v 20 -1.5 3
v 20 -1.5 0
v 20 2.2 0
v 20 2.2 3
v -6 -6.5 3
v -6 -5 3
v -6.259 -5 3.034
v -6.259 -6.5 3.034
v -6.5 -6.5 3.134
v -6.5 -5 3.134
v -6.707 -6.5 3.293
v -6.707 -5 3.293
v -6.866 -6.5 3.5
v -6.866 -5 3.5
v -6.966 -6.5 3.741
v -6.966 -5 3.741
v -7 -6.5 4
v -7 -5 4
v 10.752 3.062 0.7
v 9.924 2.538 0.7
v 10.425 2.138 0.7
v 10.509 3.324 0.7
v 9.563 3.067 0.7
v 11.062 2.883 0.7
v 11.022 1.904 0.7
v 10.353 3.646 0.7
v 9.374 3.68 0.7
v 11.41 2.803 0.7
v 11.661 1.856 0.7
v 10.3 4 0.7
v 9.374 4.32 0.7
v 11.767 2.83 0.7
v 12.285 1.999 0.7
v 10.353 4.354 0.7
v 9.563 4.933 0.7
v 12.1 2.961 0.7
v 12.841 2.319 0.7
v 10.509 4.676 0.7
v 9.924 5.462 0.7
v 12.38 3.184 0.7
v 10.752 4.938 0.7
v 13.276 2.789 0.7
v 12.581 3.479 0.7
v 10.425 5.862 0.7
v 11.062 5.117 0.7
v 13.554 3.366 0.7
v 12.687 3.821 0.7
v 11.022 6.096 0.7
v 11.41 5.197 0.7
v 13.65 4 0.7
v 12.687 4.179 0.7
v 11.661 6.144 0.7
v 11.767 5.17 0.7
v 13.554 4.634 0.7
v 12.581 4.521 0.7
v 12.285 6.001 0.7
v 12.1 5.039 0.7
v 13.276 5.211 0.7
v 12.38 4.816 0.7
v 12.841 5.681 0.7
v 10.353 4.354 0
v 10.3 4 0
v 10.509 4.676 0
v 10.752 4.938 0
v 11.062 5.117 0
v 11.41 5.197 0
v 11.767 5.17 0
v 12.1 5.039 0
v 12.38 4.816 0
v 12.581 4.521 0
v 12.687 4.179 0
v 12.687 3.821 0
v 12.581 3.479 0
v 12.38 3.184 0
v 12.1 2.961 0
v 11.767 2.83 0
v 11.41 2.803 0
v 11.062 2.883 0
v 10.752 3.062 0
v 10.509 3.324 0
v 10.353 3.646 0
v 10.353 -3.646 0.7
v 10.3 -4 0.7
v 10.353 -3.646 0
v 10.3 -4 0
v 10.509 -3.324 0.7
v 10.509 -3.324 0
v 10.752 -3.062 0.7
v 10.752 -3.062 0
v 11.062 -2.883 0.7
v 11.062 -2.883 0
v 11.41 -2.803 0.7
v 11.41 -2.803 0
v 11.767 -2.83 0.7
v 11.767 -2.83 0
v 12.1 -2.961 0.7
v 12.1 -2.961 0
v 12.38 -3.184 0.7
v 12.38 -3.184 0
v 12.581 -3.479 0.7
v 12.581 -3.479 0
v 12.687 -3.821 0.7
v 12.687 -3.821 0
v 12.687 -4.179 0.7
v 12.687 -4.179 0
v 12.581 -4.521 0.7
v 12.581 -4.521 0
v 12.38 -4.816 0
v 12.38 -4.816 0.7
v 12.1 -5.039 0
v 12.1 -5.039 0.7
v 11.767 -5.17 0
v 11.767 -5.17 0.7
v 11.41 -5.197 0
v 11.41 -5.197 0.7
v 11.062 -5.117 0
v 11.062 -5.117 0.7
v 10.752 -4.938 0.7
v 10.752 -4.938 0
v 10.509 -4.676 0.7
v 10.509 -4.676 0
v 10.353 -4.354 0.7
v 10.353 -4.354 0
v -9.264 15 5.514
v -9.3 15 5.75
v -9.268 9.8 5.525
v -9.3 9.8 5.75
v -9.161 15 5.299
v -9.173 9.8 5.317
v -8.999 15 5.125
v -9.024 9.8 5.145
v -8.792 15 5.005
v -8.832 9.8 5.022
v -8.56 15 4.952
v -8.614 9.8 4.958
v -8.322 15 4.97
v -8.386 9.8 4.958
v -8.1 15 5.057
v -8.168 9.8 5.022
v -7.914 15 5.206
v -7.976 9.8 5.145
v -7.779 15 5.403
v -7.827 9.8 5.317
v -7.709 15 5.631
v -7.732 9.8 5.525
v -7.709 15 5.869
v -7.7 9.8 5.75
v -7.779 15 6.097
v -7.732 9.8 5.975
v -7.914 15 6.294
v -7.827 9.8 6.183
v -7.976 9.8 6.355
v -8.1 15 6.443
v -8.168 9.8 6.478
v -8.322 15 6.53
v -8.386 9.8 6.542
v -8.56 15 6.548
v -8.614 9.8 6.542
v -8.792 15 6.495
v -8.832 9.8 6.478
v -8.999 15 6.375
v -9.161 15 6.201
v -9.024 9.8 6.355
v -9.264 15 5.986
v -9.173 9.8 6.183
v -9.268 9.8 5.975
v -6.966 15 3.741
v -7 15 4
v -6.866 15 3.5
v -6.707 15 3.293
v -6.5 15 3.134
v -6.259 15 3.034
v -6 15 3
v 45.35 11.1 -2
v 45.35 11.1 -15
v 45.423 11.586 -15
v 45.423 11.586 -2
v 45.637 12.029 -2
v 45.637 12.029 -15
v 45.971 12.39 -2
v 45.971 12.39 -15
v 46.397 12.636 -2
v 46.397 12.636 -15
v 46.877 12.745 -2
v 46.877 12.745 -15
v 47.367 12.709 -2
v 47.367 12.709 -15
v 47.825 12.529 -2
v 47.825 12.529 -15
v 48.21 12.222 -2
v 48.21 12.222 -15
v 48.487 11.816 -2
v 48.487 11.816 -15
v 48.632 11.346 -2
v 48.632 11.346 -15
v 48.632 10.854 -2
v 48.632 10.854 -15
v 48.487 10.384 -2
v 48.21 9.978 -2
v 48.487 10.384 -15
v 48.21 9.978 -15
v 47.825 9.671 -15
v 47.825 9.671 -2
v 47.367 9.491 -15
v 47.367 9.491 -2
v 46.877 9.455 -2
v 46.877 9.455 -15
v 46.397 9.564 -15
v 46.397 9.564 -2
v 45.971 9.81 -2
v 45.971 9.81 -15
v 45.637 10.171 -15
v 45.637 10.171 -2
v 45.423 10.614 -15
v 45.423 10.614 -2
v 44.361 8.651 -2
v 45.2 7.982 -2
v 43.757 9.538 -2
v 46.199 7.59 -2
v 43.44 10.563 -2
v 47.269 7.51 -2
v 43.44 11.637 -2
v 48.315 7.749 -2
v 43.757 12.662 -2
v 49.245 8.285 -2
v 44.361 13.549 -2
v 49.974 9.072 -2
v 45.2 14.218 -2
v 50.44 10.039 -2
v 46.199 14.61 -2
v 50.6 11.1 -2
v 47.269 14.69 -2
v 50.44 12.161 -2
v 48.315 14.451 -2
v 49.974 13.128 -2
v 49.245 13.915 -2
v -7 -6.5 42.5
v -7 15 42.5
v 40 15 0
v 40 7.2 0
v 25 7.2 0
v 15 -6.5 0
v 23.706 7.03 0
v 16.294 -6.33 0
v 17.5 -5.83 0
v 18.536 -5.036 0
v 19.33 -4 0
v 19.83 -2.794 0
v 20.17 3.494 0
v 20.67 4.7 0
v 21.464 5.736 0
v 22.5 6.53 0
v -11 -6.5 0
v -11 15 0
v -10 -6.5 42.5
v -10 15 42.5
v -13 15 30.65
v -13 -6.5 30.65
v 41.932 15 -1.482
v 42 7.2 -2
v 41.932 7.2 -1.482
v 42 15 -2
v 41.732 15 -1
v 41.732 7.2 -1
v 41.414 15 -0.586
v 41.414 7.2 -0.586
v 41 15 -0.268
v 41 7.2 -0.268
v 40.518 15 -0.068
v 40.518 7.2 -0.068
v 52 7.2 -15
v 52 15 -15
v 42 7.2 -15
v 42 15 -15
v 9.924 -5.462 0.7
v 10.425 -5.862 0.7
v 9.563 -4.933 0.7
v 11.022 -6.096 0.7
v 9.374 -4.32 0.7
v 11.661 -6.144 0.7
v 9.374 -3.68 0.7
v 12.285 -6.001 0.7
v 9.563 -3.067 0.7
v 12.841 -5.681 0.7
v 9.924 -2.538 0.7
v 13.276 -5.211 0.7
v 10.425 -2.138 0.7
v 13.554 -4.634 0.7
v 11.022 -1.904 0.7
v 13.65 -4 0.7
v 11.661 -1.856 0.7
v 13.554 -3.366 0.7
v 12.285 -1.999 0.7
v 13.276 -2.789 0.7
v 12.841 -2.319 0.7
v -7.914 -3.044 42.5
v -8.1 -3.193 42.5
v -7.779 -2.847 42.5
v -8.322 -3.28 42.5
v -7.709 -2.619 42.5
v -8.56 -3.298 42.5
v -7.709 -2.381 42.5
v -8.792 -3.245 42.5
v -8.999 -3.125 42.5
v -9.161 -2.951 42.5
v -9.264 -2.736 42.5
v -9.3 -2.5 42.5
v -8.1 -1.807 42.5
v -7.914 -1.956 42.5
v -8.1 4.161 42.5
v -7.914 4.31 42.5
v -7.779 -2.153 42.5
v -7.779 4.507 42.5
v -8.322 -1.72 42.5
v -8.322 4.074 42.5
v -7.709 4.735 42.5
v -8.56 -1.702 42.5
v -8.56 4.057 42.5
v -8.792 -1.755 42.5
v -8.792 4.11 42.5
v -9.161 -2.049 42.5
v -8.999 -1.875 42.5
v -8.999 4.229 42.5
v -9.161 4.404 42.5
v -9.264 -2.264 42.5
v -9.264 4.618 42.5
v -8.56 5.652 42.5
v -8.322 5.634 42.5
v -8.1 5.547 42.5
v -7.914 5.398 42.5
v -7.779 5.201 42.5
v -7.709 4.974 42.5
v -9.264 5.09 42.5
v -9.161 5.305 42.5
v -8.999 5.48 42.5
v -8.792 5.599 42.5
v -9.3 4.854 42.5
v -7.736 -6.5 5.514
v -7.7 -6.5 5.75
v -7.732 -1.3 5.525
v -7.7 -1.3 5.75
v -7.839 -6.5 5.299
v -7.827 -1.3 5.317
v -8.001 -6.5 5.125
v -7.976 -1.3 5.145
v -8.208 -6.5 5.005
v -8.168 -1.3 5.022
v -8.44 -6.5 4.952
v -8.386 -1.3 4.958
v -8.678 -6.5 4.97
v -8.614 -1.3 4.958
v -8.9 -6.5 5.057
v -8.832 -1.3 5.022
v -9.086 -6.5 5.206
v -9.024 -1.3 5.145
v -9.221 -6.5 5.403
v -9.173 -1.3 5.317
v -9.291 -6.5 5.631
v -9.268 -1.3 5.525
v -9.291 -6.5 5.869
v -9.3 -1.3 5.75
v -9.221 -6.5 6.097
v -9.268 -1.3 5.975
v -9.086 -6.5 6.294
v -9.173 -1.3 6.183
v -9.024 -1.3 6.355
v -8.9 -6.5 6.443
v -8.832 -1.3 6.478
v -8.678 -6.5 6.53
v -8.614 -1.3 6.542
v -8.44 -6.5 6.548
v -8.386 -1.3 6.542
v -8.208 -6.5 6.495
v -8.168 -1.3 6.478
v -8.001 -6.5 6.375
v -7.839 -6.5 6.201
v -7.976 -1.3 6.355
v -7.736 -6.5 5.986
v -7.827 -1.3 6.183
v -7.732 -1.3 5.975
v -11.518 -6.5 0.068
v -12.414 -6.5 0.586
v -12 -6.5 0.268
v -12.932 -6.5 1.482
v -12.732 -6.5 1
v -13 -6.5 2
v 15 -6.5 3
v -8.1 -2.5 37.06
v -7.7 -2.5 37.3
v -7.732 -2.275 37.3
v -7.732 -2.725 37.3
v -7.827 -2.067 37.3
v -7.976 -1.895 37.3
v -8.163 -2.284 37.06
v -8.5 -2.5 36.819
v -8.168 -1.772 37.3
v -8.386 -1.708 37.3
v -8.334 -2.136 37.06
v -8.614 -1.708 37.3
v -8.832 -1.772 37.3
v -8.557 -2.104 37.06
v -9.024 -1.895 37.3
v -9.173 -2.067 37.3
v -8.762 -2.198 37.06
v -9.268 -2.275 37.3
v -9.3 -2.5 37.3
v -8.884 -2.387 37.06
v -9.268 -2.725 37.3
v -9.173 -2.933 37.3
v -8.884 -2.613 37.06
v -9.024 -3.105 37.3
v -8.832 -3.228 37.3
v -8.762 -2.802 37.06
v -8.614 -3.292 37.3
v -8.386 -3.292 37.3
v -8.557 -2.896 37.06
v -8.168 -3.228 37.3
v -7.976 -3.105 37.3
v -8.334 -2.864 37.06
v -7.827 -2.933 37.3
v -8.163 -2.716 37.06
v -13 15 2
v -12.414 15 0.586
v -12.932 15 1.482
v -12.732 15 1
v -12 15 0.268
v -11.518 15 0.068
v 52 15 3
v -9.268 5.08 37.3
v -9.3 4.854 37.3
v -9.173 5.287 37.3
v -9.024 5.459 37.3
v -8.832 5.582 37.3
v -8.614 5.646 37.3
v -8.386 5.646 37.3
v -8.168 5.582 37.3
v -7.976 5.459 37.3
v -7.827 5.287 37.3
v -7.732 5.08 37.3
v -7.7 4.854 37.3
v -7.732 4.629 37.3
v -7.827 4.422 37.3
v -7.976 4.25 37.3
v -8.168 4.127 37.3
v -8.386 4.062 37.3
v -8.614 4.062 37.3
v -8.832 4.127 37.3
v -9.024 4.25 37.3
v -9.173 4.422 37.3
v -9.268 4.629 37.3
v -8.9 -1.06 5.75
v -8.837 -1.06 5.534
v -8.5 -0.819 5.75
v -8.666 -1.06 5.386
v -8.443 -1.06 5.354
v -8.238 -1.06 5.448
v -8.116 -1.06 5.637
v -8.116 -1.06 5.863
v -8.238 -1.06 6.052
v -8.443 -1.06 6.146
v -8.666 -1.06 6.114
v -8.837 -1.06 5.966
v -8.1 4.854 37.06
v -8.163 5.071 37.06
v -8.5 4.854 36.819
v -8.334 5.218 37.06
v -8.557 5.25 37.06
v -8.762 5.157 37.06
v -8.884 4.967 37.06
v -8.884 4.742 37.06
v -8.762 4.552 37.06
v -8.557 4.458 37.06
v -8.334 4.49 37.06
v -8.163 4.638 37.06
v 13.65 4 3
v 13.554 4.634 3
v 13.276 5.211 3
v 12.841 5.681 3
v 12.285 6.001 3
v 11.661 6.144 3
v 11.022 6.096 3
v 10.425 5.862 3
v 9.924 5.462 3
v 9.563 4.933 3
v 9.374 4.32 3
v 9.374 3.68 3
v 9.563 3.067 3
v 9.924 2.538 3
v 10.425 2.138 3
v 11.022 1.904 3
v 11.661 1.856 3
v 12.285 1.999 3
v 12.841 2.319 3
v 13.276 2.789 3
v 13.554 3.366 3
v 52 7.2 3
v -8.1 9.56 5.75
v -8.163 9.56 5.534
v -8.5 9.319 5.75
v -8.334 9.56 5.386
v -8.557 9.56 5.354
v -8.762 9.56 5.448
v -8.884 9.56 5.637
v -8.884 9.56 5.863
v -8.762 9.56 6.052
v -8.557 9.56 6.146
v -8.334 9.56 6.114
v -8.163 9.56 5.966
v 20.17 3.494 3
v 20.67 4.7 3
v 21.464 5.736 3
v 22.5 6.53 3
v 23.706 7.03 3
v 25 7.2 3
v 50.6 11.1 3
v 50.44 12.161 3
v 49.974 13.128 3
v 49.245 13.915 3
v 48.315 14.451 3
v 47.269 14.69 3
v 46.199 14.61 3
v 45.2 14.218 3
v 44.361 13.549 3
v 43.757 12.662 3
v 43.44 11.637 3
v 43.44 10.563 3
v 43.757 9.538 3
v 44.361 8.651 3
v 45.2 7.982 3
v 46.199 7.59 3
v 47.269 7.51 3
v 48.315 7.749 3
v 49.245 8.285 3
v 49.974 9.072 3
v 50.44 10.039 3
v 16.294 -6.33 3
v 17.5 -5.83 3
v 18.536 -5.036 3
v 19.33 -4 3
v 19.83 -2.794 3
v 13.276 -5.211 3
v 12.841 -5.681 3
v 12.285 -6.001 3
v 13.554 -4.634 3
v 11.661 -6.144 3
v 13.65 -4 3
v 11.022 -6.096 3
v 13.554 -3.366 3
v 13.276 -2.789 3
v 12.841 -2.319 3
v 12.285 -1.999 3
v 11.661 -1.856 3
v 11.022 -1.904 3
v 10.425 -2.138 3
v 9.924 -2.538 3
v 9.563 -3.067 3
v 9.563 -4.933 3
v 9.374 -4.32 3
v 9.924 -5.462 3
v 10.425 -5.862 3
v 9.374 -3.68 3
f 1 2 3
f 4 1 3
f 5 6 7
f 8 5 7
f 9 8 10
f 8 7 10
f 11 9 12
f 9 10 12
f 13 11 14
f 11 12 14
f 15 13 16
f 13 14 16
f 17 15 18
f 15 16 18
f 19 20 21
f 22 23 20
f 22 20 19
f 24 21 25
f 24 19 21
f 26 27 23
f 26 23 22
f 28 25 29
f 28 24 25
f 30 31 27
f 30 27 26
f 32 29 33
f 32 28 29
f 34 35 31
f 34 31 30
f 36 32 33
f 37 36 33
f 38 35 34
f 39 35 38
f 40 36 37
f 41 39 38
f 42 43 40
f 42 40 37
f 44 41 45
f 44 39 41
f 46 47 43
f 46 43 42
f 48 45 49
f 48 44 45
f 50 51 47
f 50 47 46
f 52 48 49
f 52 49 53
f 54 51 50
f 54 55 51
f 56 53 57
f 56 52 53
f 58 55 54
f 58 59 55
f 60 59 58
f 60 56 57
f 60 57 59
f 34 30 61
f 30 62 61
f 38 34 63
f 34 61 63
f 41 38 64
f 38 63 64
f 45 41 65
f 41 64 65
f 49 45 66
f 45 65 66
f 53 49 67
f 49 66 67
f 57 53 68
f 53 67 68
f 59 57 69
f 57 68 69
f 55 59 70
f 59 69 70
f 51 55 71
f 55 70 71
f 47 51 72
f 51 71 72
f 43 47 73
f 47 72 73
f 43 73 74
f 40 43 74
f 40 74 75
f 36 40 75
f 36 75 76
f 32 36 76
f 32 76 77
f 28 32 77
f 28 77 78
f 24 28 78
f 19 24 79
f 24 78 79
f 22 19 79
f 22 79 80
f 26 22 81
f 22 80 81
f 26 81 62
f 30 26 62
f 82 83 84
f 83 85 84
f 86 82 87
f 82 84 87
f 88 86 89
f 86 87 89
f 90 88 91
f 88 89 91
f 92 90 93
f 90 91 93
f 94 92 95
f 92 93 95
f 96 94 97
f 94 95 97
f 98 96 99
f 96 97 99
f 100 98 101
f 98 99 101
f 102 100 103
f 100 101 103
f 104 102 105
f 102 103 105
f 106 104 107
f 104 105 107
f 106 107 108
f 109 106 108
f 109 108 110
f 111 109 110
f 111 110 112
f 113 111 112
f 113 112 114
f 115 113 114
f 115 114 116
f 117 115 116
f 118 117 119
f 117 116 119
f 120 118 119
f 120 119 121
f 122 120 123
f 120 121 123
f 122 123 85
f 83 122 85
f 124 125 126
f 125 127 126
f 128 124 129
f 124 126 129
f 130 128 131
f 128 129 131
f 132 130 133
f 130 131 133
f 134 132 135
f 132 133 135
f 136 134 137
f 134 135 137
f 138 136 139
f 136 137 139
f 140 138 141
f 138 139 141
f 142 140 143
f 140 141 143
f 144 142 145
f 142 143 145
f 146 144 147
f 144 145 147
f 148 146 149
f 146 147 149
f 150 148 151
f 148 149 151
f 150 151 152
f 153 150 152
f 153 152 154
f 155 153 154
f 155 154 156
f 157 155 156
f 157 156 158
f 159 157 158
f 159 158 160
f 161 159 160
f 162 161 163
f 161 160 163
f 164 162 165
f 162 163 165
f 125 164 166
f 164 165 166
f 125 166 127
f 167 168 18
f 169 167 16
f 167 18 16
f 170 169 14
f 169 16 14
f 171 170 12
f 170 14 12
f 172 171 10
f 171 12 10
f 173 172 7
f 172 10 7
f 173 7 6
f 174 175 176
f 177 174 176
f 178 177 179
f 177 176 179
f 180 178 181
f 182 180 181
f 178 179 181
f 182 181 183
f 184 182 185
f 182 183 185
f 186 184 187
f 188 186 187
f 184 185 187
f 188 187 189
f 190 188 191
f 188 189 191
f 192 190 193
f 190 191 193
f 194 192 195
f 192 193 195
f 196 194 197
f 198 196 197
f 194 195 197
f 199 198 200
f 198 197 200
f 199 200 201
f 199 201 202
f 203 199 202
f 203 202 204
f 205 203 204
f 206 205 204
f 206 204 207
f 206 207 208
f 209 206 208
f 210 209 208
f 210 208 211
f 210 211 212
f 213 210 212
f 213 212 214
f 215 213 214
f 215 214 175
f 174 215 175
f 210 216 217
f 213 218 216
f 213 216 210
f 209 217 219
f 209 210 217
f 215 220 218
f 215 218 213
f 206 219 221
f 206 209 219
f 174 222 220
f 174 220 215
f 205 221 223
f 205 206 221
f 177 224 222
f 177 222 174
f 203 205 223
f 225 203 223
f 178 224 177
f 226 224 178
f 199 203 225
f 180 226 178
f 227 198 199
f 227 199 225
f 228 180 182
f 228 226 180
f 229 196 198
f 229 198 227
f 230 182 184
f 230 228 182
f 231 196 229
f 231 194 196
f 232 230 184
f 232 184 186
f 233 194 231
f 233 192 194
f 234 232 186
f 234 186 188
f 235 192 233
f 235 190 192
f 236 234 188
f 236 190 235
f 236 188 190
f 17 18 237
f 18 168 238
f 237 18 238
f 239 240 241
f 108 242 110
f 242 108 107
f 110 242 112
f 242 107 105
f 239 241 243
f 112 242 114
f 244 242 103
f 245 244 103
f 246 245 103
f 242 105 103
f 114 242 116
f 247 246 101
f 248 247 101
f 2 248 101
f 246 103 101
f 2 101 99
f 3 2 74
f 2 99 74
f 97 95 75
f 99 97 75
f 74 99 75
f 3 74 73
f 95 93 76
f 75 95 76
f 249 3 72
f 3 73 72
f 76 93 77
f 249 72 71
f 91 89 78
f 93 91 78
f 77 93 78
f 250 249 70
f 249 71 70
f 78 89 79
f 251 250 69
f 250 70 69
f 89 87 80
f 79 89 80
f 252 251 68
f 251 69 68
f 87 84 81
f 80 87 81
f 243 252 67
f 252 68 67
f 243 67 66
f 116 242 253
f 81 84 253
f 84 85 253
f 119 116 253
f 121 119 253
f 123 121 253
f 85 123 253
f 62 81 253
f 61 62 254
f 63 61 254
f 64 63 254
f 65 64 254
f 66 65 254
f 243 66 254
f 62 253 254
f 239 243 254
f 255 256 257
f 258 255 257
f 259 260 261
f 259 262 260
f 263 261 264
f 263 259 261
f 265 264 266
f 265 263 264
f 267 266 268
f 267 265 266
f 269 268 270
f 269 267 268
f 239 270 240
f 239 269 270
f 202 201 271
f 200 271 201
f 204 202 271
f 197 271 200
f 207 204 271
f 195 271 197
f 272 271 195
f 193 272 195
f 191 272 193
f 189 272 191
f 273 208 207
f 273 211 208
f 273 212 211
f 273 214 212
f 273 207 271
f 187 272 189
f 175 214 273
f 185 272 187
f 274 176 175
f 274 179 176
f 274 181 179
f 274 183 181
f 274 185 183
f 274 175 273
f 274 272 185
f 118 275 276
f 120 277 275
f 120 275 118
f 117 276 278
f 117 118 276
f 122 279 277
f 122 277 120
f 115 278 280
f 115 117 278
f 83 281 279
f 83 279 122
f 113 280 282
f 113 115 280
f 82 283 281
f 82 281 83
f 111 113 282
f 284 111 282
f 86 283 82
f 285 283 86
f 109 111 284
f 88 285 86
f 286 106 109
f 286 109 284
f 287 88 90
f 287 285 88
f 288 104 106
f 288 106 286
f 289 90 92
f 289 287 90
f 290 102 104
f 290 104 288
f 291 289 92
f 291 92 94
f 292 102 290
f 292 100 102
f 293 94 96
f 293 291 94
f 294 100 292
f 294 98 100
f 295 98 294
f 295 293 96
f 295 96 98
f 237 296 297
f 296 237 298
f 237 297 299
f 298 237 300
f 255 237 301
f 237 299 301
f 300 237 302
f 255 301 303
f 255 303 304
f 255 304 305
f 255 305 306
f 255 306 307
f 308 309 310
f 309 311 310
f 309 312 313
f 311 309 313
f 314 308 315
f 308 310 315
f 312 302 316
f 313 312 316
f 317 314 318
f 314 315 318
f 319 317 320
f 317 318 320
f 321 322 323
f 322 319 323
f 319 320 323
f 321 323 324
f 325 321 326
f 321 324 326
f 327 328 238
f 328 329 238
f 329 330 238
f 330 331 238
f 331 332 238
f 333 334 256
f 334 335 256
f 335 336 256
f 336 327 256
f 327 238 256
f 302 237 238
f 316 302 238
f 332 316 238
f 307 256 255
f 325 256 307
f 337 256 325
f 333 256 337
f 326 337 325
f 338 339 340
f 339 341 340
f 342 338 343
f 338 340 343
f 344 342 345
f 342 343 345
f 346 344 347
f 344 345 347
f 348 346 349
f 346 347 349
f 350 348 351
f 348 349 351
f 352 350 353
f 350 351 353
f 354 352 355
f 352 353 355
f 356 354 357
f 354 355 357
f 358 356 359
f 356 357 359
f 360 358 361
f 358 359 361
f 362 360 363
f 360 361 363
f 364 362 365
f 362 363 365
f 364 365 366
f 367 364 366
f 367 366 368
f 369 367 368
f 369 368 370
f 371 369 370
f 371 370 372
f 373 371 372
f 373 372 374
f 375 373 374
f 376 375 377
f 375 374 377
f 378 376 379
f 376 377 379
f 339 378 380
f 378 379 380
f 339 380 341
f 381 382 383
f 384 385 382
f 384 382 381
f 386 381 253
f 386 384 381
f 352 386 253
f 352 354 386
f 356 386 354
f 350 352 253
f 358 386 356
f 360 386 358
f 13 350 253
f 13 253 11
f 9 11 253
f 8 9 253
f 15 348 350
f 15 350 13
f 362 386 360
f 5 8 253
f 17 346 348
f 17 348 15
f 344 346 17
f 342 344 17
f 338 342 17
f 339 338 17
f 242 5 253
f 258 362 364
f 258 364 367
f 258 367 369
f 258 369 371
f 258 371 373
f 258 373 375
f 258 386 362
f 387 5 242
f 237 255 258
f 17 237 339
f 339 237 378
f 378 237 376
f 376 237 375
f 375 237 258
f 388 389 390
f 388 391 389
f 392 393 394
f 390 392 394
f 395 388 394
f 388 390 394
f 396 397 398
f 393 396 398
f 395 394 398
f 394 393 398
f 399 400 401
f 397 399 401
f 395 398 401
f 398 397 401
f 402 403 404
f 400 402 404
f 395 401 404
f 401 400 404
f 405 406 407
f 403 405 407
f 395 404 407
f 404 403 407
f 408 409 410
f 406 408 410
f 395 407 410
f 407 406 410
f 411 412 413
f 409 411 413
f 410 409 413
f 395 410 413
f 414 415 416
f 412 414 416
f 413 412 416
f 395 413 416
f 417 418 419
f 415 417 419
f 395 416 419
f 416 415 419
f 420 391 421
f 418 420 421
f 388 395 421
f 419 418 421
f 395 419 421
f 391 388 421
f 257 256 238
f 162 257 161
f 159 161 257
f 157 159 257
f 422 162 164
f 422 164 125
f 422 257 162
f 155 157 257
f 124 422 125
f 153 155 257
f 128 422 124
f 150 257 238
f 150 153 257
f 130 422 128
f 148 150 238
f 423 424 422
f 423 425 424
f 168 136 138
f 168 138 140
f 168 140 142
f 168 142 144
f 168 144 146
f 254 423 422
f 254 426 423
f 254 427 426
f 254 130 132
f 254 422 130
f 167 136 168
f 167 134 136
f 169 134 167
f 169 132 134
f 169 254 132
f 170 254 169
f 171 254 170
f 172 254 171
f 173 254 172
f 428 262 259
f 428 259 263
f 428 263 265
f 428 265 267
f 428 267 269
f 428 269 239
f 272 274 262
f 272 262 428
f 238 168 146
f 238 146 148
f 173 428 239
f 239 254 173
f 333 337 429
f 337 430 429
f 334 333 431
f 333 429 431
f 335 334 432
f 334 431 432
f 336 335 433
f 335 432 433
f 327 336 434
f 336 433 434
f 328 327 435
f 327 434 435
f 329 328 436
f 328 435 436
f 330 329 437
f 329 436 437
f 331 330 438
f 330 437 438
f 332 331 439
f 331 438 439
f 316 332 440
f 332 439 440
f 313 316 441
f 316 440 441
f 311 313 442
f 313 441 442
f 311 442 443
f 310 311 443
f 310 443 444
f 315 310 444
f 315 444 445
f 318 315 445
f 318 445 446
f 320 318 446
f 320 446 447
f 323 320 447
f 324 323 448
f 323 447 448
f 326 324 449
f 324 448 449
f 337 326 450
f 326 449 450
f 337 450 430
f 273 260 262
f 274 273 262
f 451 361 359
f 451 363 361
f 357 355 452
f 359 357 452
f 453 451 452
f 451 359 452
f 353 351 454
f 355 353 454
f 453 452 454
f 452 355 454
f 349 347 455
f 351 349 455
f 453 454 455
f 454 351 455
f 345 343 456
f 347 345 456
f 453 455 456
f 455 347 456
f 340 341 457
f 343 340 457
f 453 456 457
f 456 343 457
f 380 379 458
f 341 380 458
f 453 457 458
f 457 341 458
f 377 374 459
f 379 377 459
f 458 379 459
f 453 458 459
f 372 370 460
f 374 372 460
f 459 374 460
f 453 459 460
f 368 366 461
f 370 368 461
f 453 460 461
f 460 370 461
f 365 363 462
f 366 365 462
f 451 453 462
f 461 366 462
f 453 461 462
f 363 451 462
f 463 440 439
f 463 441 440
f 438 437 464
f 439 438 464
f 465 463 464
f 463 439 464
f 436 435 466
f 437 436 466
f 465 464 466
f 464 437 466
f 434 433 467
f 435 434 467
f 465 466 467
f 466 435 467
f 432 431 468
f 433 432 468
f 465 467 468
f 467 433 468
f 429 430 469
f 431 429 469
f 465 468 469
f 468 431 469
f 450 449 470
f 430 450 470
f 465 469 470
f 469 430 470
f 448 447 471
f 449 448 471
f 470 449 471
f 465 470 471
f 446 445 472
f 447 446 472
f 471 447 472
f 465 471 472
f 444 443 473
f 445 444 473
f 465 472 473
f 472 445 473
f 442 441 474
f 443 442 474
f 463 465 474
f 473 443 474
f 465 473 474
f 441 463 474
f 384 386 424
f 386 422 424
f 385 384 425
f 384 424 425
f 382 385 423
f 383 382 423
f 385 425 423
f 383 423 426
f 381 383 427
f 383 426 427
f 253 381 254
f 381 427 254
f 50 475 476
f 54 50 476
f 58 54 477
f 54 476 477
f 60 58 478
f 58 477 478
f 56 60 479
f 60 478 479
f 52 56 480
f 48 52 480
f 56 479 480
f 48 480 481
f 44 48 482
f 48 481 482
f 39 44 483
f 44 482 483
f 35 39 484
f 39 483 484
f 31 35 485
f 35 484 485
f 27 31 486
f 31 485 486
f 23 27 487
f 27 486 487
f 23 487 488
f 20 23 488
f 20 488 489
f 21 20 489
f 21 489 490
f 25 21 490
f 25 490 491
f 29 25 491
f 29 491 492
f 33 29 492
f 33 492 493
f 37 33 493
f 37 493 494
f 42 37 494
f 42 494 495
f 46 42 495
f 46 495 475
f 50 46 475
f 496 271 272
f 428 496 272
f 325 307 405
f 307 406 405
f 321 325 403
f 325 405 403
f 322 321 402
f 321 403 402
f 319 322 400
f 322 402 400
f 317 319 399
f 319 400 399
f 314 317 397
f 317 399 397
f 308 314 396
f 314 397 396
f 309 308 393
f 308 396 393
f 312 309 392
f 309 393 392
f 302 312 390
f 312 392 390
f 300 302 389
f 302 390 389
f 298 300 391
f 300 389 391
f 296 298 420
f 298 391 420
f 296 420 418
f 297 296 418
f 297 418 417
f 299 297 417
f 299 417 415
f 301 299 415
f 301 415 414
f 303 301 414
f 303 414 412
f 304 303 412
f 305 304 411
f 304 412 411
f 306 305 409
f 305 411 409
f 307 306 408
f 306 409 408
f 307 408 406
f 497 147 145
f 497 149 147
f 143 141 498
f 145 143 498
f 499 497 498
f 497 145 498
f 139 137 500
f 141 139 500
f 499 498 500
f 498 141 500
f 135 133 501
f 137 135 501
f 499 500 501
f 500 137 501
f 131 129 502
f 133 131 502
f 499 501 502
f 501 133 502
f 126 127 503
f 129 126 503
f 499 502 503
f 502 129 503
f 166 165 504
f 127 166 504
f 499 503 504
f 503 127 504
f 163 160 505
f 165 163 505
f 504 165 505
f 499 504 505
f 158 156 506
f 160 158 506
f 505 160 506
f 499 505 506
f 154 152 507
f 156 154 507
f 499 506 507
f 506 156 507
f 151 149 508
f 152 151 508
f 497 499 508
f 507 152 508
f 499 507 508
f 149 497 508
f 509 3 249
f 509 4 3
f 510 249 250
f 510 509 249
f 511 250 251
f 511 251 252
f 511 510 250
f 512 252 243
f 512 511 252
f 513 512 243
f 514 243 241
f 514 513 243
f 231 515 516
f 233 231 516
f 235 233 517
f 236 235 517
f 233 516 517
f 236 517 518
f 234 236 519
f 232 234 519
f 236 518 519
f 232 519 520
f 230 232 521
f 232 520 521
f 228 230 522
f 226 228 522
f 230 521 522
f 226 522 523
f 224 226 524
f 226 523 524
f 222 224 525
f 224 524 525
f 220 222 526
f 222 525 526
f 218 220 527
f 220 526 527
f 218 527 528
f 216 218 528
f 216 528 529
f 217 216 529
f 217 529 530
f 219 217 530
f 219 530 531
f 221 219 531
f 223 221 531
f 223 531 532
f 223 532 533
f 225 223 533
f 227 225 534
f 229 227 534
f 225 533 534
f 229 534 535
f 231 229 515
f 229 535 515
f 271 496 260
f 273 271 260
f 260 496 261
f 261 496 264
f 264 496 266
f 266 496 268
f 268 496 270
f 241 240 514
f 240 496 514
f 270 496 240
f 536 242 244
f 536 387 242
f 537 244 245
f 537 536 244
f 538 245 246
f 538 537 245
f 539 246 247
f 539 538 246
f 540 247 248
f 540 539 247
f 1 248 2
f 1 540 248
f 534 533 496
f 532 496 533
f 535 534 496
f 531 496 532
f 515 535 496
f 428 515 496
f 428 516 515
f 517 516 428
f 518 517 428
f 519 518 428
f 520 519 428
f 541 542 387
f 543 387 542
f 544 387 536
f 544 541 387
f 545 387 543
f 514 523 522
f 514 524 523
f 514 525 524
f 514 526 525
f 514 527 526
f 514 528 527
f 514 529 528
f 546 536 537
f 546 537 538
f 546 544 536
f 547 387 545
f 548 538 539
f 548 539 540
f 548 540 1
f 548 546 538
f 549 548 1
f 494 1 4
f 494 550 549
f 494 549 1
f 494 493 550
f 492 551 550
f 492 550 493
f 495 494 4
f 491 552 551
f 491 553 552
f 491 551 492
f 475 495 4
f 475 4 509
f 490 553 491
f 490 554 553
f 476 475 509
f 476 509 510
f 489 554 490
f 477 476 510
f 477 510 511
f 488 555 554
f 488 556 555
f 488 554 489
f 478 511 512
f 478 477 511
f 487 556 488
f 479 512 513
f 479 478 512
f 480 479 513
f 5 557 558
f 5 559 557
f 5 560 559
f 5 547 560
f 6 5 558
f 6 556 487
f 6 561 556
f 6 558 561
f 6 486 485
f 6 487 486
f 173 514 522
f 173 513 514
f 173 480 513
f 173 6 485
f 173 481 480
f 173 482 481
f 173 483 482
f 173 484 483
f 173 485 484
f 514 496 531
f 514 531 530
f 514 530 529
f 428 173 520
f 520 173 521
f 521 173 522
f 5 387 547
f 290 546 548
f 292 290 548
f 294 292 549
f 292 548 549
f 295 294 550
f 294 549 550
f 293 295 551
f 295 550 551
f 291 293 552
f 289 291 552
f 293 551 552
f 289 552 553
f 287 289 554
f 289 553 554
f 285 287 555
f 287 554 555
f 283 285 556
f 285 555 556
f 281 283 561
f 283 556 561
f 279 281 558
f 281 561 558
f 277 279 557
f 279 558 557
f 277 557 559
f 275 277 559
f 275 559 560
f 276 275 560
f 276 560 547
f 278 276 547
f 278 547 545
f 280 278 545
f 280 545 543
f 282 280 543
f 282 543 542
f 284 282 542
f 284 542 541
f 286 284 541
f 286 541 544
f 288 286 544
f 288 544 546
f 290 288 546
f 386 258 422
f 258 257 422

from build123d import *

# Parameters (mm, degrees)
SKETCH_1_W                = 40
SKETCH_1_H                = 10
EXTRUDE_1_DEPTH           = 3
SKETCH_2_W                = 3
SKETCH_2_H                = 10
EXTRUDE_2_DEPTH           = 39.5
EXTRUDE_3_DEPTH           = 10
FILLET_1_R                = 1
SKETCH_4_W                = 40
SKETCH_4_H                = 3
EXTRUDE_4_DEPTH           = 10
HOLE_WIZARD_1_D           = 2.4
HOLE_WIZARD_1_DEPTH       = 3.2
HOLE_WIZARD_1_CBORE_D     = 4.3
HOLE_WIZARD_1_CBORE_DEPTH = 2.3
HOLE_WIZARD_1_TIP         = 0.721032743
HOLE_WIZARD_M2_1_D        = 1.6
HOLE_WIZARD_M2_1_DEPTH    = 5.2
HOLE_WIZARD_M2_1_TIP      = 0.480688495
SKETCH_12_W               = 40
SKETCH_12_H               = 8.5
CUT_EXTRUDE_1_DEPTH       = 43.5
SKETCH_13_W               = 3
SKETCH_13_H               = 21.5
EXTRUDE_5_DEPTH           = 5
SKETCH_14_W               = 3
SKETCH_14_H               = 7.8
EXTRUDE_6_DEPTH           = 27
EXTRUDE_8_DEPTH           = 10
SKETCH_18_W               = 10.684104654
SKETCH_18_H               = 46.640580652
CUT_EXTRUDE_2_DEPTH       = 30
SKETCH_22_W               = 10
SKETCH_22_H               = 7.8
EXTRUDE_9_DEPTH           = 15
SKETCH_23_R               = 3.6
CUT_EXTRUDE_3_DEPTH       = 5
HOLE_WIZARD_M4_1_D        = 3.3
FILLET_2_R                = 2
SKETCH_26_W               = 5
SKETCH_26_H               = 13.7
CUT_EXTRUDE_4_DEPTH       = 8
EXTRUDE_10_DEPTH          = 10
EXTRUDE_11_DEPTH          = 1.5
HOLE_WIZARD_M2_2_D        = 1.6
HOLE_WIZARD_M2_2_DEPTH    = 5.2
HOLE_WIZARD_M2_2_TIP      = 0.480688495
HOLE_WIZARD_M2_3_D        = 1.6
HOLE_WIZARD_M2_3_DEPTH    = 5.2
HOLE_WIZARD_M2_3_TIP      = 0.480688495
HOLE_WIZARD_M2_4_D        = 1.6
HOLE_WIZARD_M2_4_DEPTH    = 5.2
HOLE_WIZARD_M2_4_TIP      = 0.480688495
FILLET_3_R                = 2
FILLET_4_R                = 5


with BuildPart() as part:
    # 草图1 → 凸台-拉伸1 (new body)
    with BuildSketch(Plane.XY):
        Rectangle(SKETCH_1_W, SKETCH_1_H)
    extrude(amount=EXTRUDE_1_DEPTH)

    # 草图2 → 凸台-拉伸2 (add)
    with BuildSketch(Plane.XY.offset(3)):
        with Locations((-8.5, 0)):
            Rectangle(SKETCH_2_W, SKETCH_2_H)
    extrude(amount=EXTRUDE_2_DEPTH)

    # 草图3 → 凸台-拉伸3 (add)
    with BuildSketch(Plane(origin=(0, 5, 0), x_dir=(1, 0, 0), z_dir=(0, 1, 0))):
        Polygon((-20, -3), (-10, -42.5), (-10, -30.276150361), (-16.905354522, -3), align=None)
    extrude(amount=-EXTRUDE_3_DEPTH)

    # 圆角1
    fillet_1_edges = [part.edges().sort_by_distance(p)[0] for p in [
        (-7, 0, 3),
    ]]
    fillet(fillet_1_edges, radius=FILLET_1_R)

    # 草图4 → 凸台-拉伸4 (add)
    with BuildSketch(Plane(origin=(0, 5, 0), x_dir=(1, 0, 0), z_dir=(0, 1, 0))):
        with Locations((0, -1.5)):
            Rectangle(SKETCH_4_W, SKETCH_4_H)
    extrude_4 = extrude(amount=EXTRUDE_4_DEPTH)

    # 镜向1: 凸台-拉伸4 across plane
    add(extrude_4.mirror(Plane.ZX))

    # 打孔尺寸(%根据)内六角圆柱头螺钉的类型1
    with Locations(Plane.XY.offset(3)):
        with Locations((11.5, 4), (11.5, -4)):
            CounterBoreHole(HOLE_WIZARD_1_D / 2, HOLE_WIZARD_1_CBORE_D / 2, HOLE_WIZARD_1_CBORE_DEPTH, depth=HOLE_WIZARD_1_DEPTH)
            with Locations((0, 0, -(HOLE_WIZARD_1_DEPTH + HOLE_WIZARD_1_TIP / 2))):  # 118° drill point
                Cone(0, HOLE_WIZARD_1_D / 2, HOLE_WIZARD_1_TIP, mode=Mode.SUBTRACT)

    # M2 螺纹孔1
    with Locations(Plane.XY.offset(42.5)):
        with Locations((-8.5, -2.5)):
            Hole(HOLE_WIZARD_M2_1_D / 2, depth=HOLE_WIZARD_M2_1_DEPTH)
            with Locations((0, 0, -(HOLE_WIZARD_M2_1_DEPTH + HOLE_WIZARD_M2_1_TIP / 2))):  # 118° drill point
                Cone(0, HOLE_WIZARD_M2_1_D / 2, HOLE_WIZARD_M2_1_TIP, mode=Mode.SUBTRACT)

    # 草图12 → 切除-拉伸1 (cut, through all)
    with BuildSketch(Plane(origin=(0, 0, 0), x_dir=(-1, 0, 0), z_dir=(0, 0, -1))):
        with Locations((0, -10.75)):
            Rectangle(SKETCH_12_W, SKETCH_12_H)
    extrude(amount=-CUT_EXTRUDE_1_DEPTH, mode=Mode.SUBTRACT)

    # 草图13 → 凸台-拉伸5 (add)
    with BuildSketch(Plane(origin=(20, 0, 0), x_dir=(0, 0, -1), z_dir=(1, 0, 0))):
        with Locations((-1.5, 4.25)):
            Rectangle(SKETCH_13_W, SKETCH_13_H)
    extrude(amount=EXTRUDE_5_DEPTH)

    # 草图14 → 凸台-拉伸6 (add)
    with BuildSketch(Plane(origin=(25, 0, 0), x_dir=(0, 0, -1), z_dir=(1, 0, 0))):
        with Locations((-1.5, 11.1)):
            Rectangle(SKETCH_14_W, SKETCH_14_H)
    extrude(amount=EXTRUDE_6_DEPTH)

    # 草图17 → 凸台-拉伸8 (add)
    with BuildSketch(Plane(origin=(0, 5, 0), x_dir=(1, 0, 0), z_dir=(0, 1, 0))):
        Polygon((-16.905354522, -3), (-10, -30.276150361), (-10, -3), align=None)
    extrude(amount=-EXTRUDE_8_DEPTH)

    # 草图18 → 切除-拉伸2 (cut, symmetric)
    with BuildSketch(Plane(origin=(0, 0, 0), x_dir=(1, 0, 0), z_dir=(0, 1, 0))):
        with Locations((-18.342052327, -18.918804504)):
            Rectangle(SKETCH_18_W, SKETCH_18_H)
    extrude(amount=CUT_EXTRUDE_2_DEPTH, both=True, mode=Mode.SUBTRACT)

    # 草图22 → 凸台-拉伸9 (add)
    with BuildSketch(Plane(origin=(0, 0, 0), x_dir=(-1, 0, 0), z_dir=(0, 0, -1))):
        with Locations((-47, 11.1)):
            Rectangle(SKETCH_22_W, SKETCH_22_H)
    extrude(amount=EXTRUDE_9_DEPTH)

    # 草图23 → 切除-拉伸3 (cut)
    with BuildSketch(Plane.XY.offset(3)):
        with Locations((47, 11.1)):
            Circle(SKETCH_23_R)
    extrude(amount=-CUT_EXTRUDE_3_DEPTH, mode=Mode.SUBTRACT)

    # M4 螺纹孔1 (through all)
    with Locations(Plane.XY.offset(-2)):
        with Locations((47, 11.1)):
            Hole(HOLE_WIZARD_M4_1_D / 2)

    # 圆角2
    fillet_2_edges = [part.edges().sort_by_distance(p)[0] for p in [
        (42, 11.1, 0),
    ]]
    fillet(fillet_2_edges, radius=FILLET_2_R)

    # 草图26 → 切除-拉伸4 (cut)
    with BuildSketch(Plane(origin=(0, 0, 0), x_dir=(-1, 0, 0), z_dir=(0, 0, -1))):
        with Locations((-22.5, 0.35)):
            Rectangle(SKETCH_26_W, SKETCH_26_H)
    extrude(amount=-CUT_EXTRUDE_4_DEPTH, mode=Mode.SUBTRACT)

    # 草图27 → 凸台-拉伸10 (add)
    with BuildSketch(Plane(origin=(0, 5, 0), x_dir=(1, 0, 0), z_dir=(0, 1, 0))):
        with BuildLine():
            Line((-6, -3), (-13, -3))
            Line((-13, -3), (-13, -30.65))
            Line((-13, -30.65), (-10, -42.5))
            Line((-10, -42.5), (-7, -42.5))
            Line((-7, -42.5), (-7, -4))
            ThreePointArc((-7, -4), (-6.707106781, -3.292893219), (-6, -3))
        make_face()
    extrude(amount=EXTRUDE_10_DEPTH)

    # 草图28 → 凸台-拉伸11 (add)
    with BuildSketch(Plane.XZ.offset(5)):
        with BuildLine():
            Line((-10, 42.5), (-13, 30.65))
            Line((-13, 30.65), (-13, 3))
            Line((-13, 3), (-6, 3))
            ThreePointArc((-6, 3), (-6.707106781, 3.292893219), (-7, 4))
            Line((-7, 4), (-7, 42.5))
            Line((-7, 42.5), (-10, 42.5))
        make_face()
    extrude(amount=EXTRUDE_11_DEPTH)

    # M2 螺纹孔2
    with Locations(Plane.XY.offset(42.5)):
        with Locations((-8.5, 4.854272417)):
            Hole(HOLE_WIZARD_M2_2_D / 2, depth=HOLE_WIZARD_M2_2_DEPTH)
            with Locations((0, 0, -(HOLE_WIZARD_M2_2_DEPTH + HOLE_WIZARD_M2_2_TIP / 2))):  # 118° drill point
                Cone(0, HOLE_WIZARD_M2_2_D / 2, HOLE_WIZARD_M2_2_TIP, mode=Mode.SUBTRACT)

    # M2 螺纹孔3
    with Locations(Plane(origin=(0, -6.5, 0), x_dir=(-1, 0, 0), z_dir=(0, -1, 0))):
        with Locations((8.5, -5.75)):
            Hole(HOLE_WIZARD_M2_3_D / 2, depth=HOLE_WIZARD_M2_3_DEPTH)
            with Locations((0, 0, -(HOLE_WIZARD_M2_3_DEPTH + HOLE_WIZARD_M2_3_TIP / 2))):  # 118° drill point
                Cone(0, HOLE_WIZARD_M2_3_D / 2, HOLE_WIZARD_M2_3_TIP, mode=Mode.SUBTRACT)

    # M2 螺纹孔4
    with Locations(Plane(origin=(0, 15, 0), x_dir=(1, 0, 0), z_dir=(0, 1, 0))):
        with Locations((-8.5, -5.75)):
            Hole(HOLE_WIZARD_M2_4_D / 2, depth=HOLE_WIZARD_M2_4_DEPTH)
            with Locations((0, 0, -(HOLE_WIZARD_M2_4_DEPTH + HOLE_WIZARD_M2_4_TIP / 2))):  # 118° drill point
                Cone(0, HOLE_WIZARD_M2_4_D / 2, HOLE_WIZARD_M2_4_TIP, mode=Mode.SUBTRACT)

    # 圆角3
    fillet_3_edges = [part.edges().sort_by_distance(p)[0] for p in [
        (-13, 4.25, 0),
    ]]
    fillet(fillet_3_edges, radius=FILLET_3_R)

    # 圆角4
    fillet_4_edges = [part.edges().sort_by_distance(p)[0] for p in [
        (20, 7.2, 1.5),
        (20, -6.5, 1.5),
    ]]
    fillet(fillet_4_edges, radius=FILLET_4_R)


solid = part.part
